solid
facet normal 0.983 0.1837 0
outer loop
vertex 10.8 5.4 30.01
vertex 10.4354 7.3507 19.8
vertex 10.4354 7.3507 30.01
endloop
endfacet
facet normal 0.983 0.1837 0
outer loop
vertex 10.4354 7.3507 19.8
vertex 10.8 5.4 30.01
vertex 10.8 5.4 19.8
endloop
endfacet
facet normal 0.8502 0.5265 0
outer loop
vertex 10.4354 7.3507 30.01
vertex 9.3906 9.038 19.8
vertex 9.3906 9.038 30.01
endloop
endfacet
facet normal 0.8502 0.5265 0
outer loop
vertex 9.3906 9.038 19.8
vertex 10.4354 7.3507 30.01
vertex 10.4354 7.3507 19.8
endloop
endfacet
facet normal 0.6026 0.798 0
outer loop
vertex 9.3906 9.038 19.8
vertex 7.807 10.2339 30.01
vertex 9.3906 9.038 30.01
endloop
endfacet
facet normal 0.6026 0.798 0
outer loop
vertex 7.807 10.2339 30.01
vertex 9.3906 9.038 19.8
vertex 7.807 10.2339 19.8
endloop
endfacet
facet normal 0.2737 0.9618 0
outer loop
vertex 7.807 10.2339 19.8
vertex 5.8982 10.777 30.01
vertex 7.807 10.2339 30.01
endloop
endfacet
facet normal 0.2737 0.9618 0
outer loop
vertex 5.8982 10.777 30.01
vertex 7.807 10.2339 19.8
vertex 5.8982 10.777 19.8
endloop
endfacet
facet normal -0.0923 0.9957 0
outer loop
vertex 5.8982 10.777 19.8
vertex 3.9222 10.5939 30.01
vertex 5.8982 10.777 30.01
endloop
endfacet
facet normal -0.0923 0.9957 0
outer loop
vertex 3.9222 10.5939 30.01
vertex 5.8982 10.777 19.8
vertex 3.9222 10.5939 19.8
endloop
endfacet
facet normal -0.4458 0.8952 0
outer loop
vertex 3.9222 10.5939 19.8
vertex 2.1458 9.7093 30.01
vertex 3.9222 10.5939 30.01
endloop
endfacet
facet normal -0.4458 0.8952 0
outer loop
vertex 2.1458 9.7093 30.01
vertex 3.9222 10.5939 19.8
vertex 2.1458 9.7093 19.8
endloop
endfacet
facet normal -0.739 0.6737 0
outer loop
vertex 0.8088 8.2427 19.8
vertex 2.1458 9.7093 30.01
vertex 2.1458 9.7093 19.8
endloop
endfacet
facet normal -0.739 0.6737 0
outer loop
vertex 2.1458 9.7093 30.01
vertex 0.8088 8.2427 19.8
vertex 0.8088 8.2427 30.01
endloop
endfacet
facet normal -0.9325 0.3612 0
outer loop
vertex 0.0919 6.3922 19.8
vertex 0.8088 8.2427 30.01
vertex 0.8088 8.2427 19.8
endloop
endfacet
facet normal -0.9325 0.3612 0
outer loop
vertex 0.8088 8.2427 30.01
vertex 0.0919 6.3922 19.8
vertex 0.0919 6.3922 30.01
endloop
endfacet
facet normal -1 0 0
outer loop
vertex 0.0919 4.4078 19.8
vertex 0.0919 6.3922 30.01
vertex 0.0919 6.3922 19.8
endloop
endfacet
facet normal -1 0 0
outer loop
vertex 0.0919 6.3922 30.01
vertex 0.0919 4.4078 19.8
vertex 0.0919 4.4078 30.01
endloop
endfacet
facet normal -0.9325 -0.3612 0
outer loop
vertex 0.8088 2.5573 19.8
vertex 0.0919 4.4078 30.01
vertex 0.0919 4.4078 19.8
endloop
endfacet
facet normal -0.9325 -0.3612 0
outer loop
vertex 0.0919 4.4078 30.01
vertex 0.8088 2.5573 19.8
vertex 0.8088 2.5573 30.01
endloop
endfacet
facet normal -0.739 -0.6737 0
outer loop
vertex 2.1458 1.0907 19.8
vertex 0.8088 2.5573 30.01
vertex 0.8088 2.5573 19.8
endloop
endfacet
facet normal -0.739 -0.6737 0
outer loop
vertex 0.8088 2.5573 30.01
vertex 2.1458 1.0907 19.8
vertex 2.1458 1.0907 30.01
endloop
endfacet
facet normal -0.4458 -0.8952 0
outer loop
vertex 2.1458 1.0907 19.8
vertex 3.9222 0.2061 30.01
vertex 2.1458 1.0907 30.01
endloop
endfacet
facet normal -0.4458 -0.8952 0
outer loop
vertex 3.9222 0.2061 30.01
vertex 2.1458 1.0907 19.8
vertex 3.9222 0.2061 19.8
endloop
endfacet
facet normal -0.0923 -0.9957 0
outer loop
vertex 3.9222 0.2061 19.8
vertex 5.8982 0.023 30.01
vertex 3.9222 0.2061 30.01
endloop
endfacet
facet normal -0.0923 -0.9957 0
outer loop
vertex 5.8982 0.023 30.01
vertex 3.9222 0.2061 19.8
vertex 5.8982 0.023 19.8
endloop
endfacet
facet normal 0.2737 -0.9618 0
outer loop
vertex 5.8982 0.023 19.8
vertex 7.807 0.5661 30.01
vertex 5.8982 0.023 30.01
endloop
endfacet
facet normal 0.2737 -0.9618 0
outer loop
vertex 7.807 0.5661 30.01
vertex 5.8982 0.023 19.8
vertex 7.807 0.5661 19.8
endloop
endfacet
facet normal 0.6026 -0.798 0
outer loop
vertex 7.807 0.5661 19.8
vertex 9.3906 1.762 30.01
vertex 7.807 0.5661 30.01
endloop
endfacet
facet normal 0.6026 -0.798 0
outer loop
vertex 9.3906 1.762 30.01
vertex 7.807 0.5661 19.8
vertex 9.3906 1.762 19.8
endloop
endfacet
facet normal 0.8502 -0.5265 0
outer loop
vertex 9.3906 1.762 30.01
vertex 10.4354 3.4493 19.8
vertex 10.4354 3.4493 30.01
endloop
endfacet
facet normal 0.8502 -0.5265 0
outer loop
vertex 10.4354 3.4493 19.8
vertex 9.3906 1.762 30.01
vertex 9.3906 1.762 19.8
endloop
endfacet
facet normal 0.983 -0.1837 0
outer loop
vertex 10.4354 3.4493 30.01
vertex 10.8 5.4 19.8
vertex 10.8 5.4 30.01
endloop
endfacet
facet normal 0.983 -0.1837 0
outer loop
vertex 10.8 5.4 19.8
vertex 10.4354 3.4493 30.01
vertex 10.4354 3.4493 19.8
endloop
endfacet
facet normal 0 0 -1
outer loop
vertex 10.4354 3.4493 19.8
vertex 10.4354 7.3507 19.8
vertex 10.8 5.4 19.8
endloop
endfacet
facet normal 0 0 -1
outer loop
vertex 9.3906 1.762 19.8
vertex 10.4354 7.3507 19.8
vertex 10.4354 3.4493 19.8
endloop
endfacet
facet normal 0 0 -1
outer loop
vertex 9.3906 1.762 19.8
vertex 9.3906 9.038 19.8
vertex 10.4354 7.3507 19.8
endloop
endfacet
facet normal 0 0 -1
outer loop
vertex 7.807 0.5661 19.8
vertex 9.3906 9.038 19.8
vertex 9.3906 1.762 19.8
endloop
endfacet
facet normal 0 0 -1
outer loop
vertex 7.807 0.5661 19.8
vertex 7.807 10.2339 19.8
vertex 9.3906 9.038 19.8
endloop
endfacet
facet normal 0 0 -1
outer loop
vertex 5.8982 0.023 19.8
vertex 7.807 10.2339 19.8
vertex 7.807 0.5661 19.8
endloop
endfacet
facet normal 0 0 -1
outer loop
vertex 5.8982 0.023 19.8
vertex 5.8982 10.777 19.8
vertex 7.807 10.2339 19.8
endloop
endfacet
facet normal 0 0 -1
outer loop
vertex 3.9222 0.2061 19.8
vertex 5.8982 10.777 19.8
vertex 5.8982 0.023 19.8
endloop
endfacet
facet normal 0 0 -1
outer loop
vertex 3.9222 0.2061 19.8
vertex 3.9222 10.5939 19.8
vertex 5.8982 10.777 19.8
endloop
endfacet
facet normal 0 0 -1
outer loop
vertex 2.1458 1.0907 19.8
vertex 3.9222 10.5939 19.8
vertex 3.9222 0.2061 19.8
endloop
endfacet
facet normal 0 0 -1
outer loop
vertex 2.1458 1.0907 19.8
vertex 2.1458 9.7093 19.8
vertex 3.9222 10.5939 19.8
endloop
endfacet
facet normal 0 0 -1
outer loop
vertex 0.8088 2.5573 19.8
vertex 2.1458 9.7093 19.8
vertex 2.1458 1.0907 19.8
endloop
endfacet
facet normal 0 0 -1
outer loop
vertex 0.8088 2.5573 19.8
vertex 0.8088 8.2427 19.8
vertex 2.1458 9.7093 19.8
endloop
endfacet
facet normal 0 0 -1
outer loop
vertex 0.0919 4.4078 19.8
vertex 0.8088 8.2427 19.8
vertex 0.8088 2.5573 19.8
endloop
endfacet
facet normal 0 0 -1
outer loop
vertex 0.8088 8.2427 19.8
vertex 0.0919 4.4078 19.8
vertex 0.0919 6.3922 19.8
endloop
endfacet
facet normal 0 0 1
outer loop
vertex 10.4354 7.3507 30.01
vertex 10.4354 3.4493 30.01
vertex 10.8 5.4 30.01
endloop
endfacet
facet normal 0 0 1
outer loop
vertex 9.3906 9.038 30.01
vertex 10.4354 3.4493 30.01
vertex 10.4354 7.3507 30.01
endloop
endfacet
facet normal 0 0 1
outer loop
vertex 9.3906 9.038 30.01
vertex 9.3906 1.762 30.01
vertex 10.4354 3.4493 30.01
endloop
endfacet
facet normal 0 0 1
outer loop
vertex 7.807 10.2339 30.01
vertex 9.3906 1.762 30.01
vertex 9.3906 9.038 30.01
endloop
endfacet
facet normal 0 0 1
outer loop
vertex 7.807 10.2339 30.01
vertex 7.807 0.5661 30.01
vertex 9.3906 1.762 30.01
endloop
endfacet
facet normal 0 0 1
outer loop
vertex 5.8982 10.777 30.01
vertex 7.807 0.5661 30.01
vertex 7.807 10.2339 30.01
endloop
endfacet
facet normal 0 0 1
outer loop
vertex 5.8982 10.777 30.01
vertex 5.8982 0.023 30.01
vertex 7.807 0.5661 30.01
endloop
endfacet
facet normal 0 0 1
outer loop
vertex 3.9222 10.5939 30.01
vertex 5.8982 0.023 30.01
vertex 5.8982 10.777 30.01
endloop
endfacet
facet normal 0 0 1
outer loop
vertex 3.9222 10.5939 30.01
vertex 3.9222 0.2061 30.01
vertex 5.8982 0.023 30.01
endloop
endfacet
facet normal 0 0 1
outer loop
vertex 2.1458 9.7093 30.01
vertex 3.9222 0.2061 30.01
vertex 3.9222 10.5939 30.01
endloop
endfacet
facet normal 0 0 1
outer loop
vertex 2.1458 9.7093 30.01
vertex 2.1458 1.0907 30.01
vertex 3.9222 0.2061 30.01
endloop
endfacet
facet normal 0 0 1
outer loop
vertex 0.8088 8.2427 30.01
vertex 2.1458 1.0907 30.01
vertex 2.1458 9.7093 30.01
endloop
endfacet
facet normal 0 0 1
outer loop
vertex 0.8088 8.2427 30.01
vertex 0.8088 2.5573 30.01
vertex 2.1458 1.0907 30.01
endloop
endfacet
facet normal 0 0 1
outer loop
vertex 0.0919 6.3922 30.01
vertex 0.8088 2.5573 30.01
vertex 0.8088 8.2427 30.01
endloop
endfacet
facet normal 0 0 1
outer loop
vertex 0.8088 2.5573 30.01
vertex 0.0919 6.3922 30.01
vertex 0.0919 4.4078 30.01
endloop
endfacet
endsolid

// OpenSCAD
// file: ../../lib/layout/layout.scad
$padding = 0.5;
$wall_thickness = 2;
$padding_rect = [$padding * 2, $padding * 2];
$wall_rect = [$wall_thickness, $wall_thickness];

function stack_height (size, count=1) = size * count + $padding;

function padded_offset (length, index=1) = (length + $padding * 2 + $wall_thickness) * index;

function offset (size, index=1) = (size + $wall_thickness) * index;

function pad (size) = size + $padding * 2;

function divide_rect(rect, operand) = [rect[0] / operand, rect[1] / operand];
function multiply_rect(rect, operand) = [rect[0] * operand, rect[1] * operand];

function divide_cube(rect, operand) = [rect[0] / operand, rect[1] / operand, rec[2] / operand];
function multiply_cube(rect, operand) = [rect[0] * operand, rect[1] * operand, rect[2] * operand];

function offset_centre_in_box(size, bounding_box) = divide_rect(bounding_box - size, 2);

module offset_cylinder(d, h) {
  translate([d / 2, d / 2, 0]) {
    cylinder(d=d, h=h);
  }
}

module offset_circle(d) {
  translate([d / 2, d / 2, 0]) {
    circle(d=d);
  }
}

module offset_square(size, center=false) {
  translate([size[0] / 2, size[1] / 2, 0]) {
    square(size, center=center);
  }
}
// file: ../../lib/primitive/disc_socket.scad
include <../layout/layout.scad>

$bleed = 0.01;
$padding = 0.4;

function disc_offset (diameter, index=1) = (diameter + $padding * 2 + $wall_thickness) * index;

/**
 * A cylinder positioned to be subtracted from a box creating a socket for a
 * disc / cynlinder
 */
module disc_socket(diameter, height, box_height) {
  padded_diameter = diameter + $padding * 2;
  padded_height = height + $padding;
  cutout_height = padded_height / 2;
  radius = padded_diameter / 2;

  translate([radius, radius, box_height - cutout_height]) {
    cylinder(d=padded_diameter, h=cutout_height + $bleed, center=false);
  }
}
// main file
include <../../lib/primitive/disc_socket.scad>

disc_socket(10, 20, 30);
